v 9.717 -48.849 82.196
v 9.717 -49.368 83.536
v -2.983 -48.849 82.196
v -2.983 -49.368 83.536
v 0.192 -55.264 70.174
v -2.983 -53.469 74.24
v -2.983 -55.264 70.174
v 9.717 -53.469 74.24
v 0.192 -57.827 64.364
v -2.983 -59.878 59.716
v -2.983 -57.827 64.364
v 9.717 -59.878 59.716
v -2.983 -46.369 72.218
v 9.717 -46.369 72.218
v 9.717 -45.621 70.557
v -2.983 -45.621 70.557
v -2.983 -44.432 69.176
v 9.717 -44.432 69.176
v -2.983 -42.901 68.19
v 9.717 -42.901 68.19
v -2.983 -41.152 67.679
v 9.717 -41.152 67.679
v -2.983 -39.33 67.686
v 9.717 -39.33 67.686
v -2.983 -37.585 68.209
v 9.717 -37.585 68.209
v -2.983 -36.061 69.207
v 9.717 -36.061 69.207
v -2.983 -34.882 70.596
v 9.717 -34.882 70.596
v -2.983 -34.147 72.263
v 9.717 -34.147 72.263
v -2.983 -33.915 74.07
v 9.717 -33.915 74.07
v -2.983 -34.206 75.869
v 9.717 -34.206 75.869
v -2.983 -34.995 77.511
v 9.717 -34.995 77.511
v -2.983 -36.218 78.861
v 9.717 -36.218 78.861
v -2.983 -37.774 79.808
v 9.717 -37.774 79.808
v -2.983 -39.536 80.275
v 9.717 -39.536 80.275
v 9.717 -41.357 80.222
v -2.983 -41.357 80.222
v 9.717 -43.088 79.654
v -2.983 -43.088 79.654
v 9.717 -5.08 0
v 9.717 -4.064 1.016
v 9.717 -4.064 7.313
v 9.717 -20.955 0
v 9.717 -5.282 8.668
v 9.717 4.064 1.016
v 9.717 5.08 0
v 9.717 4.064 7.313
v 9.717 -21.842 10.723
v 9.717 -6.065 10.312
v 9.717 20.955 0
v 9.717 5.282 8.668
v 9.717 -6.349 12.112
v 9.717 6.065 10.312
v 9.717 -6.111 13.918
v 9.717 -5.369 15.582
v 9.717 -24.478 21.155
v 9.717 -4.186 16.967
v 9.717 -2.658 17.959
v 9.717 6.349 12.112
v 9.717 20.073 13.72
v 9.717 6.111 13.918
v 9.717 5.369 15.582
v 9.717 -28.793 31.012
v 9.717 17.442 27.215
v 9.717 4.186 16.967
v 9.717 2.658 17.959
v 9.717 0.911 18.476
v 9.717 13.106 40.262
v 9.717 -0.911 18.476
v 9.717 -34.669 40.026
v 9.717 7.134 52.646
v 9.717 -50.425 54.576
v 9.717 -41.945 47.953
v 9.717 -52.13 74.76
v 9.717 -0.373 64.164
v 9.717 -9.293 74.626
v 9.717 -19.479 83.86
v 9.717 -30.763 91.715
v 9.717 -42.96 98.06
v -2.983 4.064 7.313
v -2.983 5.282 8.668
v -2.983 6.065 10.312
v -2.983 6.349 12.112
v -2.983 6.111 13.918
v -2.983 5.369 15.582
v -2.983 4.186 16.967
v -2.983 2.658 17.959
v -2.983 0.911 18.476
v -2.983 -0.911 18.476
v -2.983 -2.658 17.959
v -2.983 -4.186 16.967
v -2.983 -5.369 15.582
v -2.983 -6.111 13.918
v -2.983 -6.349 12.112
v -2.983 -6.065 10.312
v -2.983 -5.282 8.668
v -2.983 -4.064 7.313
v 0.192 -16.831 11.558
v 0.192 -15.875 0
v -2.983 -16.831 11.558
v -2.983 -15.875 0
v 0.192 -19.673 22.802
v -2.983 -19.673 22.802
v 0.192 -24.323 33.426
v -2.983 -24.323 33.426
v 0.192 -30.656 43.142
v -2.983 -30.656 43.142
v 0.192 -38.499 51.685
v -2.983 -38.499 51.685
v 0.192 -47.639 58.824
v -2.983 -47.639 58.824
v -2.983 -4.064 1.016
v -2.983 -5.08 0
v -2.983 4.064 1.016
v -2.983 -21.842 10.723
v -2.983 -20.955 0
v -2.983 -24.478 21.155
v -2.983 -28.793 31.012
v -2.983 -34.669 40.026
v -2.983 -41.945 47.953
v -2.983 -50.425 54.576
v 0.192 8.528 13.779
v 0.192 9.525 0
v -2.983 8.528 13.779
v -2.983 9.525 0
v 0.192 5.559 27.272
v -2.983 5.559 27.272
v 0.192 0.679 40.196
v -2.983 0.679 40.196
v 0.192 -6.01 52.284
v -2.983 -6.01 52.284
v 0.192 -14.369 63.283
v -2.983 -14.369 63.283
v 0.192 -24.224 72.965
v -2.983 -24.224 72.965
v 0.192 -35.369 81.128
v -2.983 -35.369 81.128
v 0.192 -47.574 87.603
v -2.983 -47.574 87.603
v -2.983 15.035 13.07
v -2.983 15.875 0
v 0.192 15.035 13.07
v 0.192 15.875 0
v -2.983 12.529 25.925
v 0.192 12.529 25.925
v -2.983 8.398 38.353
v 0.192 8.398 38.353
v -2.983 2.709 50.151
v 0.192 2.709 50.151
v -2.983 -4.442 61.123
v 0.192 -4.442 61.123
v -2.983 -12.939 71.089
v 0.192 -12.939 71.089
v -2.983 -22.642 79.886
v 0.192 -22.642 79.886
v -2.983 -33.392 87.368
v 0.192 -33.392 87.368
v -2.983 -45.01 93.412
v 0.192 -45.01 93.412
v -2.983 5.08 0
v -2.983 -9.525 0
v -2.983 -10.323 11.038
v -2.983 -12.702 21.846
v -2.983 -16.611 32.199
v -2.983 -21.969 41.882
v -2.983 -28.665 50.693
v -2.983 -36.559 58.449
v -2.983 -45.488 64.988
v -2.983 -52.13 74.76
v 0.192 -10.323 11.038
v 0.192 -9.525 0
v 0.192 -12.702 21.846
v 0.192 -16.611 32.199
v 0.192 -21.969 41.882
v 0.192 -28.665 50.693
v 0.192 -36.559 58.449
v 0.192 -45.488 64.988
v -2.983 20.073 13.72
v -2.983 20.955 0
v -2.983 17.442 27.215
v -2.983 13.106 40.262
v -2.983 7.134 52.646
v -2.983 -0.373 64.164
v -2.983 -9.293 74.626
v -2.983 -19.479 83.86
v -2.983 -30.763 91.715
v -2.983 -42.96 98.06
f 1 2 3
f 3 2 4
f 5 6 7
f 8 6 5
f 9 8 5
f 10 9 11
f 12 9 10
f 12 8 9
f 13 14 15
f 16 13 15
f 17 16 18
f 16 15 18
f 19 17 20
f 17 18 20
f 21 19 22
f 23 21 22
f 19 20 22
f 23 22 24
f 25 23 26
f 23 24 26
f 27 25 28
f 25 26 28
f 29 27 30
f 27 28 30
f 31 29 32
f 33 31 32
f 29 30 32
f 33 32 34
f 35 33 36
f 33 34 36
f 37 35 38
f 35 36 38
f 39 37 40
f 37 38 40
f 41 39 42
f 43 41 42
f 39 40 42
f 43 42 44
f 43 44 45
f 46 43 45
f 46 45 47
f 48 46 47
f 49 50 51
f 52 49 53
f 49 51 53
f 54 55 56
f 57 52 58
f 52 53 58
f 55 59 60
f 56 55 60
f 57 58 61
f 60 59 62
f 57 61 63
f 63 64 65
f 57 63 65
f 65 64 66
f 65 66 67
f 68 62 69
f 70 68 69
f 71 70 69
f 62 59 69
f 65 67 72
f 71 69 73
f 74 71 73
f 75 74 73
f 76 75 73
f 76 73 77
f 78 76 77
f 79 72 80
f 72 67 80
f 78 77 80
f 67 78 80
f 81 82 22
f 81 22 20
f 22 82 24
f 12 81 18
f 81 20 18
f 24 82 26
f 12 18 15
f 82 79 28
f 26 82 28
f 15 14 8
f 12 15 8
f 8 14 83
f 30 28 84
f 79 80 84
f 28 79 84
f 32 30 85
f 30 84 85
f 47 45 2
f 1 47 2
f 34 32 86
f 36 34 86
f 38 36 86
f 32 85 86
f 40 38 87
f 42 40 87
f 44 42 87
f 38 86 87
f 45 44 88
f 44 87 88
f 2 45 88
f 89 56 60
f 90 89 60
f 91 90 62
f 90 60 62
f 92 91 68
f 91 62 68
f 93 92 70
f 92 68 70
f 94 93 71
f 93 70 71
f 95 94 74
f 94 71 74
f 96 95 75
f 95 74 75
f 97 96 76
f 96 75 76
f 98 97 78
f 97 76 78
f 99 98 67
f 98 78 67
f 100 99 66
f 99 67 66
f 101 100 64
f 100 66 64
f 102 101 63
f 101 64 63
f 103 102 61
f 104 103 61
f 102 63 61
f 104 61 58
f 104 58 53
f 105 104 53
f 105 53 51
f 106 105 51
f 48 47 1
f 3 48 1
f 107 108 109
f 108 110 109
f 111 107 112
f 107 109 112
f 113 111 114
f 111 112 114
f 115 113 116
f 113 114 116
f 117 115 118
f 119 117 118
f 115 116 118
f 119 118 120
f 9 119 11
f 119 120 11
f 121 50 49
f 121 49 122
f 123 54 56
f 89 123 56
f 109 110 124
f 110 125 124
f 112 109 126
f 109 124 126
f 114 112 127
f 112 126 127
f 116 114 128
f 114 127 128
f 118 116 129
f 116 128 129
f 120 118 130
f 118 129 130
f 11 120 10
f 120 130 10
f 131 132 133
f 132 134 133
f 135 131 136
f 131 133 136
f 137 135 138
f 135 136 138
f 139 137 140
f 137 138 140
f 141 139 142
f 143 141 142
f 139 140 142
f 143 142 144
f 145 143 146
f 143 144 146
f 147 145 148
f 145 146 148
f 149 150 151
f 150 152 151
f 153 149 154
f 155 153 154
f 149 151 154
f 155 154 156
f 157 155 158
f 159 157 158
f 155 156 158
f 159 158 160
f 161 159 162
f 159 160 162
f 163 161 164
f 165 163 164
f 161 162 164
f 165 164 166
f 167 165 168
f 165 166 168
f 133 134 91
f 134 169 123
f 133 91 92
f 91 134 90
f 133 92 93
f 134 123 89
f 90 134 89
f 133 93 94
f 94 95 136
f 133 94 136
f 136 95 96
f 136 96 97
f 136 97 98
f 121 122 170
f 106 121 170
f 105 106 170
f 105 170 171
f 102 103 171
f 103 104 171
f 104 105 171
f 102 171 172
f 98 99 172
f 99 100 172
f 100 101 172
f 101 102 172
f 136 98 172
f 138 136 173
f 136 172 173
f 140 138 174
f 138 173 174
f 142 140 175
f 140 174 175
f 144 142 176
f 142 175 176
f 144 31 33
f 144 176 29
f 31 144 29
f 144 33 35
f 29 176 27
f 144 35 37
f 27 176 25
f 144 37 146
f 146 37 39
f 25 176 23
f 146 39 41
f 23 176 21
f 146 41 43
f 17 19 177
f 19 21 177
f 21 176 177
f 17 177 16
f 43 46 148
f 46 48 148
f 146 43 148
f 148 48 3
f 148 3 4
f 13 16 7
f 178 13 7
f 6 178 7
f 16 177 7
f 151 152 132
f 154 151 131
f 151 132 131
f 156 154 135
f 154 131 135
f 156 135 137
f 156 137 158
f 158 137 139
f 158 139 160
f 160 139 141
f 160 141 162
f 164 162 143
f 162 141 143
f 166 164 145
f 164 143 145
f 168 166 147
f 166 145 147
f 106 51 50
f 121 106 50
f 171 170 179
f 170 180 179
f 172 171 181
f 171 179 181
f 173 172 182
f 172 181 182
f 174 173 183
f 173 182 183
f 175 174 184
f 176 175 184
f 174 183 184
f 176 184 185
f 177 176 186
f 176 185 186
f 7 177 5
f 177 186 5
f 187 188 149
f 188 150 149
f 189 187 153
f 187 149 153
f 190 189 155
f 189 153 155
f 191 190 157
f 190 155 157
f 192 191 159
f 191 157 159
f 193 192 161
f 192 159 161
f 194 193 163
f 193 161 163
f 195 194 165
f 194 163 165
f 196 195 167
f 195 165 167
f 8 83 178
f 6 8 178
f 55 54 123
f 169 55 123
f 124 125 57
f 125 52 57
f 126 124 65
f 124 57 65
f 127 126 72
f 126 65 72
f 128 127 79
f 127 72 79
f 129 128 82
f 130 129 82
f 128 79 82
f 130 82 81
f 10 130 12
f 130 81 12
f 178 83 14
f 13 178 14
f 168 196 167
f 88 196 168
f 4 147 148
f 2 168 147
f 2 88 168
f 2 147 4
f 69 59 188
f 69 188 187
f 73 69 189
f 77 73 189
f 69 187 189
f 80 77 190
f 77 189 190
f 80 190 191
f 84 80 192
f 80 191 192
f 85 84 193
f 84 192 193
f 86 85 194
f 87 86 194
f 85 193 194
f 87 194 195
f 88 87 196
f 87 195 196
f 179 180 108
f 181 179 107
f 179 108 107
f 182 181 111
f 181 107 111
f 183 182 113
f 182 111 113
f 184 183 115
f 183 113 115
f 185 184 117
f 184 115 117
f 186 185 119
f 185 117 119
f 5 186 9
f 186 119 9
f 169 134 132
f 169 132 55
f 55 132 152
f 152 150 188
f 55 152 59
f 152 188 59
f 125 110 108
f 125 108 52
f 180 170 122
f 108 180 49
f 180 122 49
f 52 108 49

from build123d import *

# Parameters (mm, degrees)
F4_DEPTH = 12.7
F5_SIZE  = 1.016


with BuildPart() as f2:
    # F2: sweep along a path in F1
    with BuildLine(Plane.YZ) as f2_path:
        ThreePointArc((0, 0), (-13.9895526568, 47.0829736144), (-51.4187773904, 78.8881166537))
    # F0 (on Top) → F2 (sweep)
    with BuildSketch(Plane.XY):
        Polygon((-2.9826171882, -15.875), (-2.9826171882, -20.955), (9.7173828118, -20.955), (9.7173828118, 20.955), (-2.9826171882, 20.955), (-2.9826171882, 15.875), (0.1923828118, 15.875), (0.1923828118, 9.525), (-2.9826171882, 9.525), (-2.9826171882, -9.525), (0.1923828118, -9.525), (0.1923828118, -15.875), align=None)
    sweep(path=f2_path.line)

    # F3 (on face) → F4 (cut, through all)
    with BuildSketch(Plane.YZ.offset(9.7173828118)):
        with BuildLine():
            Line((-4.064, 7.3128193311), (-4.064, 0))
            Line((-4.064, 0), (4.064, 0))
            Line((4.064, 0), (4.064, 7.3128193311))
            ThreePointArc((4.064, 7.3128193311), (0, 18.542), (-4.064, 7.3128193311))
        make_face()
        with BuildLine():
            Line((-43.0877289811, 79.6543117793), (-49.7782573242, 82.6062868909))
            Line((-49.7782573242, 82.6062868909), (-53.0592974567, 75.1699464166))
            Line((-53.0592974567, 75.1699464166), (-46.3687691136, 72.217971305))
            ThreePointArc((-46.3687691136, 72.217971305), (-34.4546256835, 71.4032438515), (-43.0877289811, 79.6543117793))
        make_face()
    extrude(amount=-F4_DEPTH, mode=Mode.SUBTRACT)

    # F5
    f5_edges = [f2.edges().sort_by_distance(p)[0] for p in [
        (3.367383, -53.059297, 75.169946),
        (3.367383, -49.778257, 82.606287),
        (3.367383, 4.064, 0),
        (3.367383, -4.064, 0),
    ]]
    chamfer(f5_edges, length=F5_SIZE)


solid = f2.part
